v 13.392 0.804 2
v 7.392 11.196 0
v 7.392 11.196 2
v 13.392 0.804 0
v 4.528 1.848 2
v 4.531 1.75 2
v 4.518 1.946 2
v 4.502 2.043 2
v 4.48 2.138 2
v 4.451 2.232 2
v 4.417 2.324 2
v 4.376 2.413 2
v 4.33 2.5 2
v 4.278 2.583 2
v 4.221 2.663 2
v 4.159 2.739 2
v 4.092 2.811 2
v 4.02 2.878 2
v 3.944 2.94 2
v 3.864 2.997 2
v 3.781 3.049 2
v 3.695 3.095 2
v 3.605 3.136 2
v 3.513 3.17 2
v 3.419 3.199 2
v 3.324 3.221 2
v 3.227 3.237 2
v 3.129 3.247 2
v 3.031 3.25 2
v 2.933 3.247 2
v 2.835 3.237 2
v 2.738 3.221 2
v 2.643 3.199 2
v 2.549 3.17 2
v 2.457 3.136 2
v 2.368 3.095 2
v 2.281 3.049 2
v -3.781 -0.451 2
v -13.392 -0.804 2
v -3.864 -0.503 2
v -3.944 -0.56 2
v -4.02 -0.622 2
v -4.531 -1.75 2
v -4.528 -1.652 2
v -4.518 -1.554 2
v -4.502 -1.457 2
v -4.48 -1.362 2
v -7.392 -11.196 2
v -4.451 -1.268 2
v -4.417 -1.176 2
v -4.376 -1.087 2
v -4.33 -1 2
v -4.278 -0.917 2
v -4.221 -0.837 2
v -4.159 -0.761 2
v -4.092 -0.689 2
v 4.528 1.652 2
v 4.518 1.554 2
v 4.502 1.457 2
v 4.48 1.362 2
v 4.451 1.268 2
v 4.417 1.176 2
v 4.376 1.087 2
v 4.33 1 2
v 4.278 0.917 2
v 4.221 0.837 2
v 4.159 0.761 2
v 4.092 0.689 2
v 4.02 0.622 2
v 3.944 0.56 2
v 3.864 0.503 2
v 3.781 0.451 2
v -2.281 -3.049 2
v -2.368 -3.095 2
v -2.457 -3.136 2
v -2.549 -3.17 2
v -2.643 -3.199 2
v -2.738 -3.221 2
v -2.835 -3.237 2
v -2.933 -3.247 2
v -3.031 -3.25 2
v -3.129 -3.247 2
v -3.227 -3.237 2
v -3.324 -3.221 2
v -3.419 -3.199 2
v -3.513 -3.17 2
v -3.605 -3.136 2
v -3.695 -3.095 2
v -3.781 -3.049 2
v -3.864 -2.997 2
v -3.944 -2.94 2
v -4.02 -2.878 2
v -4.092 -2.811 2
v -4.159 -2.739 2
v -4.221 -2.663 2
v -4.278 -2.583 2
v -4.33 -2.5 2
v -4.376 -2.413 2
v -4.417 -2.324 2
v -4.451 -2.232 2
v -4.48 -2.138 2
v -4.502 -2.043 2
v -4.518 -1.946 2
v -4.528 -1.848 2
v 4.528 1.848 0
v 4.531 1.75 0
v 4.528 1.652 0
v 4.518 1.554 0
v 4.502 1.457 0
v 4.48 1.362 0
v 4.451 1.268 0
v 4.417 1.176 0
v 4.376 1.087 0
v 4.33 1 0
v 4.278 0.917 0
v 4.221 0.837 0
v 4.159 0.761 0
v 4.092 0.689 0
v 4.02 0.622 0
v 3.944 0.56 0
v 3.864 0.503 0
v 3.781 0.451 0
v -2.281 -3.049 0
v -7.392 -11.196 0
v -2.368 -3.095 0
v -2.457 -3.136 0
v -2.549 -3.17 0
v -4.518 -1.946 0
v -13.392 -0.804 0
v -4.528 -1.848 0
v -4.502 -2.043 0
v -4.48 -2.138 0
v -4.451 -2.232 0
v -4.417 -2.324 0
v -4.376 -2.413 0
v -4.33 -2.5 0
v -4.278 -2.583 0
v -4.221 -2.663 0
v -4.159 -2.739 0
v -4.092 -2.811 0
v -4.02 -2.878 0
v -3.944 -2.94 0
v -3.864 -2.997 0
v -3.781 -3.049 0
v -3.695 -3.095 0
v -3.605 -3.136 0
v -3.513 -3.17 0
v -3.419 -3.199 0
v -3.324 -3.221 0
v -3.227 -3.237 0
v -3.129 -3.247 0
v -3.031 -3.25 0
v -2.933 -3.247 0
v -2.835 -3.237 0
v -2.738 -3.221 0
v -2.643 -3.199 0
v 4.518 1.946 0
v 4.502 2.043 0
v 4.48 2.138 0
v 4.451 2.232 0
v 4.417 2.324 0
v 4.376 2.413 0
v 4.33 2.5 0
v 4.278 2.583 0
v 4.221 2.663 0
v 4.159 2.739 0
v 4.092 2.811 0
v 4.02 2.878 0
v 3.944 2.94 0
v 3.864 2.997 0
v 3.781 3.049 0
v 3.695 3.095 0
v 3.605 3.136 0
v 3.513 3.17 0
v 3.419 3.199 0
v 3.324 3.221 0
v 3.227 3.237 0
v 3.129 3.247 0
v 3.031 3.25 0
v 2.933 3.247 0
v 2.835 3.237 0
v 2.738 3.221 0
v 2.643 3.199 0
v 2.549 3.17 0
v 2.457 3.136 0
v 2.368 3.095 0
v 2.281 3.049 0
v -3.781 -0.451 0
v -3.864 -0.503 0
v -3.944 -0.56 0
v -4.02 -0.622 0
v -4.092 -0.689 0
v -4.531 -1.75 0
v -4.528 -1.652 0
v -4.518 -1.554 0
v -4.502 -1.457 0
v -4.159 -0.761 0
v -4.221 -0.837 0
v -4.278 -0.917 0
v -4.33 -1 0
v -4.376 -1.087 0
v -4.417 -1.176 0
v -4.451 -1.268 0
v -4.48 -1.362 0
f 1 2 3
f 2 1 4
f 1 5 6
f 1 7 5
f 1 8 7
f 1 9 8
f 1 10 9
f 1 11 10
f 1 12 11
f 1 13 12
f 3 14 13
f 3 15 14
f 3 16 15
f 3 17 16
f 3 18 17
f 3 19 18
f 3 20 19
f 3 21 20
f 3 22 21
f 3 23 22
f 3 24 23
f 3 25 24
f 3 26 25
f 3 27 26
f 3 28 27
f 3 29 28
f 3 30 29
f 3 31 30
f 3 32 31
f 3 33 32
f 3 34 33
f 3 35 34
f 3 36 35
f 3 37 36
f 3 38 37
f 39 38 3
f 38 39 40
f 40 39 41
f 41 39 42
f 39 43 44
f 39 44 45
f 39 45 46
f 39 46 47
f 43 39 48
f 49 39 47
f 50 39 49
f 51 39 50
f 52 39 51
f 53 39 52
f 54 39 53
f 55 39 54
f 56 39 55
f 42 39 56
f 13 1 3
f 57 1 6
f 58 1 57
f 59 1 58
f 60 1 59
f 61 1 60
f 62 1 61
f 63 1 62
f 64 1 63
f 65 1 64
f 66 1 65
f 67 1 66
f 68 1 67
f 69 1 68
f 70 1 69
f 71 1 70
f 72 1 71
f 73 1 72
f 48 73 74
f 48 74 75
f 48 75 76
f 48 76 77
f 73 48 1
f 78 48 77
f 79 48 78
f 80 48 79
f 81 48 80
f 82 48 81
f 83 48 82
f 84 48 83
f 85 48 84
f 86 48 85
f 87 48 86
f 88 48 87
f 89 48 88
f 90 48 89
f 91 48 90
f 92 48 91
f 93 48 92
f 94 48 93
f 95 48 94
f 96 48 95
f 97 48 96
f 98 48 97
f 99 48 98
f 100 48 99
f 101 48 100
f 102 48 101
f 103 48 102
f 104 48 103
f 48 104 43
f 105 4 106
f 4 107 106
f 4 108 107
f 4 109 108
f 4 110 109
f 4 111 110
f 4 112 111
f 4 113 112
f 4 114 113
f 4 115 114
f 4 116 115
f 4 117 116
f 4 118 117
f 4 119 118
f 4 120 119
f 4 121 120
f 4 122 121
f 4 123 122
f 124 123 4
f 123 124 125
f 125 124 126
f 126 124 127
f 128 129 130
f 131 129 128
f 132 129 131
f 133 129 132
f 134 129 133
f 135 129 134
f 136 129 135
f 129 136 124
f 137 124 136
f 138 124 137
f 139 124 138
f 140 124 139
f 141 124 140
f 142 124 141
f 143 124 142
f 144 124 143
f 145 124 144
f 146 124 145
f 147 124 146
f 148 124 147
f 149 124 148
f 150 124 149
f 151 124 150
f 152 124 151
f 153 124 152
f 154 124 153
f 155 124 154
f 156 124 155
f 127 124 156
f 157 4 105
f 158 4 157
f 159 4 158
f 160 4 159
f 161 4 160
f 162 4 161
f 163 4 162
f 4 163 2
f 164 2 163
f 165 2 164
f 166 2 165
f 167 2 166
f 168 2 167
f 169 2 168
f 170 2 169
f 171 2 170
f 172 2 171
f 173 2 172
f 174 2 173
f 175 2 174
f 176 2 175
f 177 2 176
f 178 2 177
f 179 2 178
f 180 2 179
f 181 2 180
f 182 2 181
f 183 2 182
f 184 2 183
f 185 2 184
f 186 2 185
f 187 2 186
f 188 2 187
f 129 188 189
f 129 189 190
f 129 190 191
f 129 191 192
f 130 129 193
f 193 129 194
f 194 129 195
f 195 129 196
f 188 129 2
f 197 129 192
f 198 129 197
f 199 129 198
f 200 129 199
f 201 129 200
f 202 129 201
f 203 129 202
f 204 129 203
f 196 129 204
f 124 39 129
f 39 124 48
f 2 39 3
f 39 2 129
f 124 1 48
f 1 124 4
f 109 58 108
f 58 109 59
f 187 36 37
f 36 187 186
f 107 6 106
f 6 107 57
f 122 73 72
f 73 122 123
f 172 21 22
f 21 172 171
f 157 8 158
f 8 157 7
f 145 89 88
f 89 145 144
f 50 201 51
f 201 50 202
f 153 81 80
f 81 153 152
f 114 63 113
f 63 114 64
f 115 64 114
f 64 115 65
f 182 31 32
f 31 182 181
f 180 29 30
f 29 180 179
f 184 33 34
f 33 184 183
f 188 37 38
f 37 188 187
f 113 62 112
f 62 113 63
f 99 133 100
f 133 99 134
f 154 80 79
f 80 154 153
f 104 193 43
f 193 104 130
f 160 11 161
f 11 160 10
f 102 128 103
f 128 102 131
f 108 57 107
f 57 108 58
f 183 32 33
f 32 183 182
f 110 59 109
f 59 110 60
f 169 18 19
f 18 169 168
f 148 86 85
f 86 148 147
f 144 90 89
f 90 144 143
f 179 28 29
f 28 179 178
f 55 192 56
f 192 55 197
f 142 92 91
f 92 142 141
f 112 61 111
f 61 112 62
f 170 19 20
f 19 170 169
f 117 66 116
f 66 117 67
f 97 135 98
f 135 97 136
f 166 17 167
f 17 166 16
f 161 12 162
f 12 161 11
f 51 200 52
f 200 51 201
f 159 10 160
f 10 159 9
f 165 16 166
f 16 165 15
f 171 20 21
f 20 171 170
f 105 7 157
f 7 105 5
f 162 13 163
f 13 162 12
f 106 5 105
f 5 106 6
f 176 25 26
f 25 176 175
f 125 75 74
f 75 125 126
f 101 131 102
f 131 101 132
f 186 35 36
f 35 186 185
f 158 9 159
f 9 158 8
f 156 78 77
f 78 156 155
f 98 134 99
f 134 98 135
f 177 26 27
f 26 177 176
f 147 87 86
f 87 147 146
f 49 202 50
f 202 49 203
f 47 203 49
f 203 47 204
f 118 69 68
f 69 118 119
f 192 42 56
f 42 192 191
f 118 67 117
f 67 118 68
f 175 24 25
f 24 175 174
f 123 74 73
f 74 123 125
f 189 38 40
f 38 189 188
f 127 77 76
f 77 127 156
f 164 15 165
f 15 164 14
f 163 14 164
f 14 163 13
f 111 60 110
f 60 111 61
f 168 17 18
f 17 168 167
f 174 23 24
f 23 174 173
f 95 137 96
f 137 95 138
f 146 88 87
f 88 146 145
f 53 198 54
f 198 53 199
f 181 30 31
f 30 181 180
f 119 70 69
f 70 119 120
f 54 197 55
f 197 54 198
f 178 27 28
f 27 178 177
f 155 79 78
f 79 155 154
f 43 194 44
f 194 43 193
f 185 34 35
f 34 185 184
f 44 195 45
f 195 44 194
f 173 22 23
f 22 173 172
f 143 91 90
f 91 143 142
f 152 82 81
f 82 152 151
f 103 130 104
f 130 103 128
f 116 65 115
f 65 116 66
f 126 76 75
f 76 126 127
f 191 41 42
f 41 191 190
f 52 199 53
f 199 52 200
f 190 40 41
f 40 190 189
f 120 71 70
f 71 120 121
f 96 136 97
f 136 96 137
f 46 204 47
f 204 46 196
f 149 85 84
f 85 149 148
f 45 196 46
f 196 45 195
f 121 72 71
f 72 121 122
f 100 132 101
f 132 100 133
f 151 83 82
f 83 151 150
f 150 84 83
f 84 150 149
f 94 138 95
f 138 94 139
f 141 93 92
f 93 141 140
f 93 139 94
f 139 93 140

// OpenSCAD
// Auto-generated from tests/data/feature_fixtures_manifest.json
// fixture: plate_rotated_z30_with_slot
// fixture_type: plate
// description: Plate rotated 30° around Z with a single slot. Validates rotated-plate local-frame slot detection.
// transform: rotate=[0.000000, 0.000000, 30.000000], translate=[0.000000, 0.000000, 0.000000]
$fn = 96;

plate_size = [24.000000, 12.000000, 2.000000];
plate_origin = [-12.000000, -6.000000, 0.000000];

module through_hole(center, diameter, height) {
  translate(center) cylinder(d=diameter, h=height, center=false);
}

module through_slot(start, end, width, height) {
  hull() {
    through_hole(start, width, height);
    through_hole(end, width, height);
  }
}

module counterbore_hole(center, through_d, bore_d, bore_depth, plate_thickness) {
  translate([center[0], center[1], -0.1])
    cylinder(d=through_d, h=plate_thickness + 0.2, center=false);
  translate([center[0], center[1], plate_thickness - bore_depth])
    cylinder(d=bore_d, h=bore_depth + 0.1, center=false);
}

translate([0.000000, 0.000000, 0.000000])
rotate([0.000000, 0.000000, 30.000000]) {
difference() {
  translate(plate_origin) cube(plate_size);
  through_slot([-3.500000, 0.000000, -0.100000], [3.500000, 0.000000, -0.100000], 3.000000, 2.200000);  // slot_0
}
}
